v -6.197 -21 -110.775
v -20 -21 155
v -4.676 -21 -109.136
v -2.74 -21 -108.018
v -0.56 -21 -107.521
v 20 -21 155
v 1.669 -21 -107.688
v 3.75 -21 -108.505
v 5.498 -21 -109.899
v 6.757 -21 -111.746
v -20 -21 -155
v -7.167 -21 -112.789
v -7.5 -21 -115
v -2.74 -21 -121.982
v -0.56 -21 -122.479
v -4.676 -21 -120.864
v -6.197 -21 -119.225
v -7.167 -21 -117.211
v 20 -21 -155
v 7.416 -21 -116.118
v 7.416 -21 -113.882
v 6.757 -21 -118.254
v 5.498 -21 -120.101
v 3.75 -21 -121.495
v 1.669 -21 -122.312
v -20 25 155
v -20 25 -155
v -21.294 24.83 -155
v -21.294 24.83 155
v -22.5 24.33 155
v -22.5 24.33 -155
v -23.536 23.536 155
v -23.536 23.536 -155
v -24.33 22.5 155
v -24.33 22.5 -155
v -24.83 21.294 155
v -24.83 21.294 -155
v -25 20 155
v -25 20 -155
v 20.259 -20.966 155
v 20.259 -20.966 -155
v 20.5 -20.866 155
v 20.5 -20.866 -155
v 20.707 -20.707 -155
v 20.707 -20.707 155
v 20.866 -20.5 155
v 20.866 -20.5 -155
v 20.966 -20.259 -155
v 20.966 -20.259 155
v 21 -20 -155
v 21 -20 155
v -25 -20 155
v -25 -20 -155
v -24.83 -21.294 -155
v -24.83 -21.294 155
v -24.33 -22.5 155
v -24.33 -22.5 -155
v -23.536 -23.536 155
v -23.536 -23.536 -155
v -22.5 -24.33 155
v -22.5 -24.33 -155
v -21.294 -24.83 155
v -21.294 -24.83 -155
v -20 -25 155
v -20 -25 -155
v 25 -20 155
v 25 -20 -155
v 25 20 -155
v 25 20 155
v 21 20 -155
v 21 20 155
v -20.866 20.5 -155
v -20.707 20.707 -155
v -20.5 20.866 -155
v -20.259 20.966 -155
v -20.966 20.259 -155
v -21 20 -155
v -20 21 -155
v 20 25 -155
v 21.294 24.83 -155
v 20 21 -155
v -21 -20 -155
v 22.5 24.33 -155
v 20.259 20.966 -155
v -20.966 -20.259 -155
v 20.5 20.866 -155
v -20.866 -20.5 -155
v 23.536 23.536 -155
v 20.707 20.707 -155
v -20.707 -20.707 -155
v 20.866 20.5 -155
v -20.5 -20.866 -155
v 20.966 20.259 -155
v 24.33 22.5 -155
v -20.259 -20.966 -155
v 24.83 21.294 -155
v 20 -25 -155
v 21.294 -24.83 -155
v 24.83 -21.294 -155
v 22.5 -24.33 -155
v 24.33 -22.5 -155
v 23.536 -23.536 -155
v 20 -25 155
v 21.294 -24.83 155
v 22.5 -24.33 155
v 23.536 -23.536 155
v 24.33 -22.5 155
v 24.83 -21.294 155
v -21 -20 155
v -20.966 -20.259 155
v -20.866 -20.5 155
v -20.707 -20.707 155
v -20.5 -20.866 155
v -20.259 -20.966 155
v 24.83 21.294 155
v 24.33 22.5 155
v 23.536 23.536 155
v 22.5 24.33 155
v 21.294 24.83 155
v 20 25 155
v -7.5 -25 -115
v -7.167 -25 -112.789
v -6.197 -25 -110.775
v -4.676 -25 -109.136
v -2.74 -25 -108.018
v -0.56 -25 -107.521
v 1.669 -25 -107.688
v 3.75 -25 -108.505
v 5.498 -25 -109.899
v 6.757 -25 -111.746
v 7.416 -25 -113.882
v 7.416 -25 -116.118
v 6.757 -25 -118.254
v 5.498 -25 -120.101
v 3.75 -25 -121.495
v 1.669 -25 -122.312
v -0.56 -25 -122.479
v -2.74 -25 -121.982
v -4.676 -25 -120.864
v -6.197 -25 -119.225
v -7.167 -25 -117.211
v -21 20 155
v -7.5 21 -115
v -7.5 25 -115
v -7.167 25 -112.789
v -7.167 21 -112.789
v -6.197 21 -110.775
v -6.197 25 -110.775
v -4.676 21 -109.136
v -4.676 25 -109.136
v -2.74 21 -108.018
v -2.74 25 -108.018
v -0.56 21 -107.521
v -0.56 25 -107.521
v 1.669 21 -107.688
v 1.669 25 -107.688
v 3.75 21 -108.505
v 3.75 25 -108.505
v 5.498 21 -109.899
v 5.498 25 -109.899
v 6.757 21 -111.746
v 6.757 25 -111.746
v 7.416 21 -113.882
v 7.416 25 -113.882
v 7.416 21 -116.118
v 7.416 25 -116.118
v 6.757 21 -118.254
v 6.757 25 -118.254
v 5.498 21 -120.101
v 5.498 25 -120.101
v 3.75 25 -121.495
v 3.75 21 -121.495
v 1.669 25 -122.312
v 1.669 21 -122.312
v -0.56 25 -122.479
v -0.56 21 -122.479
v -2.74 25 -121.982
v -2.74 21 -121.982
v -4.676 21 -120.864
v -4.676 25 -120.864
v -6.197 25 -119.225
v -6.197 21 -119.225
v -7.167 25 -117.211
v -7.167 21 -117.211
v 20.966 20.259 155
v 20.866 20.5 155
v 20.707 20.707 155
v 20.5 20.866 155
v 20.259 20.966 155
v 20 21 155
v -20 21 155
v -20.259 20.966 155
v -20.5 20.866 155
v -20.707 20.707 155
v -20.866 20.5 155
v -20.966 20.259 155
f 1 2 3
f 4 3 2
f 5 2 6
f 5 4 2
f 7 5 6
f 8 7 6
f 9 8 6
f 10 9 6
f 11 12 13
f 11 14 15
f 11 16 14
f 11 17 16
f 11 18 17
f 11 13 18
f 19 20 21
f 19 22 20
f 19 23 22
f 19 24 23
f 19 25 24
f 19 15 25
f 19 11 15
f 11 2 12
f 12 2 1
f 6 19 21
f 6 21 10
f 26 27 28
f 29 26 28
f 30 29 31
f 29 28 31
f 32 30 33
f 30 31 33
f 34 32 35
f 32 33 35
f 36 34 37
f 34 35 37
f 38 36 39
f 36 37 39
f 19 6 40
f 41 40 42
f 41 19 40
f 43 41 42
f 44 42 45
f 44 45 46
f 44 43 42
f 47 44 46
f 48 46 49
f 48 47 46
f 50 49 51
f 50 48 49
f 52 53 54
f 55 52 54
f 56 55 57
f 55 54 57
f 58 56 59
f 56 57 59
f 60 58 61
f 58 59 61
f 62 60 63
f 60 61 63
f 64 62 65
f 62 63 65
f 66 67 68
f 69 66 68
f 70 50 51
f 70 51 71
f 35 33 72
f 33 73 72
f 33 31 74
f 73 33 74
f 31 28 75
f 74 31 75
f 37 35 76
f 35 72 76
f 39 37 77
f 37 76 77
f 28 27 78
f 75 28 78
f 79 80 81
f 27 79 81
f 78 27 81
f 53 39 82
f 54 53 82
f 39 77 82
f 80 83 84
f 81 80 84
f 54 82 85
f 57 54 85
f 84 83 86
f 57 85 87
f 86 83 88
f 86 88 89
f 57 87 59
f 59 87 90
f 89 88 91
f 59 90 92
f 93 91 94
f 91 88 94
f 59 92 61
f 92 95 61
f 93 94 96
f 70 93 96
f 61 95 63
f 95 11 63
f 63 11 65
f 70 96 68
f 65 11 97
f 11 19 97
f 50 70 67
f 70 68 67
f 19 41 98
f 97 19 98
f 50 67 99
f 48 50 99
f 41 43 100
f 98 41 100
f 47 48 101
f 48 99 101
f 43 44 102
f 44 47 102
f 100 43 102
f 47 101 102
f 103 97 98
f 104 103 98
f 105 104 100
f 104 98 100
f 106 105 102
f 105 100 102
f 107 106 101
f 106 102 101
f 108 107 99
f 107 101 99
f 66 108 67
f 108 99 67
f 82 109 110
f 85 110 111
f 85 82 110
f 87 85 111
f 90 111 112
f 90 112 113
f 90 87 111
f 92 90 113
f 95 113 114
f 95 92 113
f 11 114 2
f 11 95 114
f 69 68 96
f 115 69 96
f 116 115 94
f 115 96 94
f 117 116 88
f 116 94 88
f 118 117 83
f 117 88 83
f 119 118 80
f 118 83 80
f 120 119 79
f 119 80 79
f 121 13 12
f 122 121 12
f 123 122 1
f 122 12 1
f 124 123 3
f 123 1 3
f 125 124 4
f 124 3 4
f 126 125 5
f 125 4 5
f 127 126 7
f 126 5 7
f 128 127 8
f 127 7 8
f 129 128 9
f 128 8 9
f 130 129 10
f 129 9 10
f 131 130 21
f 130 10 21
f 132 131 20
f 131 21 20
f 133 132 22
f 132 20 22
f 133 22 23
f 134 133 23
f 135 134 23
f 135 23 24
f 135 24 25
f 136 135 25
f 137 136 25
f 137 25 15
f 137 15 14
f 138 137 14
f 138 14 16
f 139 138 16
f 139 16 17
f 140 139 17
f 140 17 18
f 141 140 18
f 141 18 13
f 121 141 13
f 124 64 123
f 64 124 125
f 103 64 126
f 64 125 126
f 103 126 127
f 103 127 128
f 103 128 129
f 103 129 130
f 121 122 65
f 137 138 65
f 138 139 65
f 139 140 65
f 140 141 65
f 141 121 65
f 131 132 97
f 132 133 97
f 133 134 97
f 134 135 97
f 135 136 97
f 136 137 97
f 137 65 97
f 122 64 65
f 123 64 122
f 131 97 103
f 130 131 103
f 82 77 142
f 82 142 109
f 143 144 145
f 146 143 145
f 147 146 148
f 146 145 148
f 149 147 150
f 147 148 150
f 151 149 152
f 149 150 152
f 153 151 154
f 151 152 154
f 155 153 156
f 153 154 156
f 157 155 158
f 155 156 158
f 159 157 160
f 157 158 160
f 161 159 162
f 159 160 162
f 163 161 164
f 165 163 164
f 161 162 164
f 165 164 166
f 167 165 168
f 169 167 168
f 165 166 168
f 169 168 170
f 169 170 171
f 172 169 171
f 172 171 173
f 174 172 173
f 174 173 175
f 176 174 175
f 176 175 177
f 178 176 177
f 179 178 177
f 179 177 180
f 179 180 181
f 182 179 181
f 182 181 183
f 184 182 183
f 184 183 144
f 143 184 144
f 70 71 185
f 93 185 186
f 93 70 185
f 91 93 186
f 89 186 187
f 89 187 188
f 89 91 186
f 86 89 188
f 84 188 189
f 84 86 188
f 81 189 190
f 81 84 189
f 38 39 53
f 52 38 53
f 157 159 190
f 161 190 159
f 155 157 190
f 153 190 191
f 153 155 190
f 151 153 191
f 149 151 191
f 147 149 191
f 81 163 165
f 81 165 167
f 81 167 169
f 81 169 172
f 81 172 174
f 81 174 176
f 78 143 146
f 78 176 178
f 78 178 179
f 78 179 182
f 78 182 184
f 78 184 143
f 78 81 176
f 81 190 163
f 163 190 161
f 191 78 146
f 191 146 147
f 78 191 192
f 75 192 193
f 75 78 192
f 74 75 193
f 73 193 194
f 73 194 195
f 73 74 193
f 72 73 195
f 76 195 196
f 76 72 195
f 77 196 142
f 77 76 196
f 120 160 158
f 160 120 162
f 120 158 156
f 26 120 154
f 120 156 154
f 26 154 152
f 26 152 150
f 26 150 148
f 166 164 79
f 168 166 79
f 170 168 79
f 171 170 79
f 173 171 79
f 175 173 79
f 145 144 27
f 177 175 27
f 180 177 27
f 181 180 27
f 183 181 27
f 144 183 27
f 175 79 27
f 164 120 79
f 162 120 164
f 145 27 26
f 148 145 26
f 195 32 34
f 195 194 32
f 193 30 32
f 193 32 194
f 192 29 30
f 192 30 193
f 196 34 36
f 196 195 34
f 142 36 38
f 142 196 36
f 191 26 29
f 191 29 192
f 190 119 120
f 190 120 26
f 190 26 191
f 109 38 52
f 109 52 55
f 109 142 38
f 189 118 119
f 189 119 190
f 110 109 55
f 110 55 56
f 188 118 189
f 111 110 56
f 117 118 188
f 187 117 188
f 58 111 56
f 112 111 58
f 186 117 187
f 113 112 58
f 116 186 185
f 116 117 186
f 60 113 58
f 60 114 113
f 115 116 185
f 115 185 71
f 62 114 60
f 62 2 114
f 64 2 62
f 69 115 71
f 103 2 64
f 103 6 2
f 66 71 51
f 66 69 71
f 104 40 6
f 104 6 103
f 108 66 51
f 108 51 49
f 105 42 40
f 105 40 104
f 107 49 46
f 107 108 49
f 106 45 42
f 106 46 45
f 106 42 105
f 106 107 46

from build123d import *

# Parameters (mm, degrees)
TUBE_SQUARE_TS3X3X0_3125_3_DEPTH = 310
SKETCH12_R                       = 7.5
CUT_EXTRUDE1_DEPTH               = 165.772570533


with BuildPart() as part:
    # Sketch11 → Tube square TS3X3X0.3125(3) (new body)
    with BuildSketch(Plane(origin=(0, 0, -155), x_dir=(0, -1, 0), z_dir=(0, 0, 1))):
        with BuildLine():
            Line((-20, -25), (20, -25))
            ThreePointArc((20, -25), (23.535533906, -23.535533906), (25, -20))
            Line((25, -20), (25, 20))
            ThreePointArc((25, 20), (23.535533906, 23.535533906), (20, 25))
            Line((20, 25), (-20, 25))
            ThreePointArc((-20, 25), (-23.535533906, 23.535533906), (-25, 20))
            Line((-25, 20), (-25, -20))
            ThreePointArc((-25, -20), (-23.535533906, -23.535533906), (-20, -25))
        make_face()
        with BuildLine():
            Line((-20, -21), (20, -21))
            ThreePointArc((20, -21), (20.707106781, -20.707106781), (21, -20))
            Line((21, -20), (21, 20))
            ThreePointArc((21, 20), (20.707106781, 20.707106781), (20, 21))
            Line((20, 21), (-20, 21))
            ThreePointArc((-20, 21), (-20.707106781, 20.707106781), (-21, 20))
            Line((-21, 20), (-21, -20))
            ThreePointArc((-21, -20), (-20.707106781, -20.707106781), (-20, -21))
        make_face(mode=Mode.SUBTRACT)
    extrude(amount=TUBE_SQUARE_TS3X3X0_3125_3_DEPTH)

    # Sketch12 → Cut-Extrude1 (cut, through all)
    with BuildSketch(Plane(origin=(0, 25, 0), x_dir=(1, 0, 0), z_dir=(0, 1, 0))):
        with Locations(Location((0, 115, 0), (0, 0, 180))):
            Circle(SKETCH12_R)
    extrude(amount=-CUT_EXTRUDE1_DEPTH, mode=Mode.SUBTRACT)


solid = part.part
